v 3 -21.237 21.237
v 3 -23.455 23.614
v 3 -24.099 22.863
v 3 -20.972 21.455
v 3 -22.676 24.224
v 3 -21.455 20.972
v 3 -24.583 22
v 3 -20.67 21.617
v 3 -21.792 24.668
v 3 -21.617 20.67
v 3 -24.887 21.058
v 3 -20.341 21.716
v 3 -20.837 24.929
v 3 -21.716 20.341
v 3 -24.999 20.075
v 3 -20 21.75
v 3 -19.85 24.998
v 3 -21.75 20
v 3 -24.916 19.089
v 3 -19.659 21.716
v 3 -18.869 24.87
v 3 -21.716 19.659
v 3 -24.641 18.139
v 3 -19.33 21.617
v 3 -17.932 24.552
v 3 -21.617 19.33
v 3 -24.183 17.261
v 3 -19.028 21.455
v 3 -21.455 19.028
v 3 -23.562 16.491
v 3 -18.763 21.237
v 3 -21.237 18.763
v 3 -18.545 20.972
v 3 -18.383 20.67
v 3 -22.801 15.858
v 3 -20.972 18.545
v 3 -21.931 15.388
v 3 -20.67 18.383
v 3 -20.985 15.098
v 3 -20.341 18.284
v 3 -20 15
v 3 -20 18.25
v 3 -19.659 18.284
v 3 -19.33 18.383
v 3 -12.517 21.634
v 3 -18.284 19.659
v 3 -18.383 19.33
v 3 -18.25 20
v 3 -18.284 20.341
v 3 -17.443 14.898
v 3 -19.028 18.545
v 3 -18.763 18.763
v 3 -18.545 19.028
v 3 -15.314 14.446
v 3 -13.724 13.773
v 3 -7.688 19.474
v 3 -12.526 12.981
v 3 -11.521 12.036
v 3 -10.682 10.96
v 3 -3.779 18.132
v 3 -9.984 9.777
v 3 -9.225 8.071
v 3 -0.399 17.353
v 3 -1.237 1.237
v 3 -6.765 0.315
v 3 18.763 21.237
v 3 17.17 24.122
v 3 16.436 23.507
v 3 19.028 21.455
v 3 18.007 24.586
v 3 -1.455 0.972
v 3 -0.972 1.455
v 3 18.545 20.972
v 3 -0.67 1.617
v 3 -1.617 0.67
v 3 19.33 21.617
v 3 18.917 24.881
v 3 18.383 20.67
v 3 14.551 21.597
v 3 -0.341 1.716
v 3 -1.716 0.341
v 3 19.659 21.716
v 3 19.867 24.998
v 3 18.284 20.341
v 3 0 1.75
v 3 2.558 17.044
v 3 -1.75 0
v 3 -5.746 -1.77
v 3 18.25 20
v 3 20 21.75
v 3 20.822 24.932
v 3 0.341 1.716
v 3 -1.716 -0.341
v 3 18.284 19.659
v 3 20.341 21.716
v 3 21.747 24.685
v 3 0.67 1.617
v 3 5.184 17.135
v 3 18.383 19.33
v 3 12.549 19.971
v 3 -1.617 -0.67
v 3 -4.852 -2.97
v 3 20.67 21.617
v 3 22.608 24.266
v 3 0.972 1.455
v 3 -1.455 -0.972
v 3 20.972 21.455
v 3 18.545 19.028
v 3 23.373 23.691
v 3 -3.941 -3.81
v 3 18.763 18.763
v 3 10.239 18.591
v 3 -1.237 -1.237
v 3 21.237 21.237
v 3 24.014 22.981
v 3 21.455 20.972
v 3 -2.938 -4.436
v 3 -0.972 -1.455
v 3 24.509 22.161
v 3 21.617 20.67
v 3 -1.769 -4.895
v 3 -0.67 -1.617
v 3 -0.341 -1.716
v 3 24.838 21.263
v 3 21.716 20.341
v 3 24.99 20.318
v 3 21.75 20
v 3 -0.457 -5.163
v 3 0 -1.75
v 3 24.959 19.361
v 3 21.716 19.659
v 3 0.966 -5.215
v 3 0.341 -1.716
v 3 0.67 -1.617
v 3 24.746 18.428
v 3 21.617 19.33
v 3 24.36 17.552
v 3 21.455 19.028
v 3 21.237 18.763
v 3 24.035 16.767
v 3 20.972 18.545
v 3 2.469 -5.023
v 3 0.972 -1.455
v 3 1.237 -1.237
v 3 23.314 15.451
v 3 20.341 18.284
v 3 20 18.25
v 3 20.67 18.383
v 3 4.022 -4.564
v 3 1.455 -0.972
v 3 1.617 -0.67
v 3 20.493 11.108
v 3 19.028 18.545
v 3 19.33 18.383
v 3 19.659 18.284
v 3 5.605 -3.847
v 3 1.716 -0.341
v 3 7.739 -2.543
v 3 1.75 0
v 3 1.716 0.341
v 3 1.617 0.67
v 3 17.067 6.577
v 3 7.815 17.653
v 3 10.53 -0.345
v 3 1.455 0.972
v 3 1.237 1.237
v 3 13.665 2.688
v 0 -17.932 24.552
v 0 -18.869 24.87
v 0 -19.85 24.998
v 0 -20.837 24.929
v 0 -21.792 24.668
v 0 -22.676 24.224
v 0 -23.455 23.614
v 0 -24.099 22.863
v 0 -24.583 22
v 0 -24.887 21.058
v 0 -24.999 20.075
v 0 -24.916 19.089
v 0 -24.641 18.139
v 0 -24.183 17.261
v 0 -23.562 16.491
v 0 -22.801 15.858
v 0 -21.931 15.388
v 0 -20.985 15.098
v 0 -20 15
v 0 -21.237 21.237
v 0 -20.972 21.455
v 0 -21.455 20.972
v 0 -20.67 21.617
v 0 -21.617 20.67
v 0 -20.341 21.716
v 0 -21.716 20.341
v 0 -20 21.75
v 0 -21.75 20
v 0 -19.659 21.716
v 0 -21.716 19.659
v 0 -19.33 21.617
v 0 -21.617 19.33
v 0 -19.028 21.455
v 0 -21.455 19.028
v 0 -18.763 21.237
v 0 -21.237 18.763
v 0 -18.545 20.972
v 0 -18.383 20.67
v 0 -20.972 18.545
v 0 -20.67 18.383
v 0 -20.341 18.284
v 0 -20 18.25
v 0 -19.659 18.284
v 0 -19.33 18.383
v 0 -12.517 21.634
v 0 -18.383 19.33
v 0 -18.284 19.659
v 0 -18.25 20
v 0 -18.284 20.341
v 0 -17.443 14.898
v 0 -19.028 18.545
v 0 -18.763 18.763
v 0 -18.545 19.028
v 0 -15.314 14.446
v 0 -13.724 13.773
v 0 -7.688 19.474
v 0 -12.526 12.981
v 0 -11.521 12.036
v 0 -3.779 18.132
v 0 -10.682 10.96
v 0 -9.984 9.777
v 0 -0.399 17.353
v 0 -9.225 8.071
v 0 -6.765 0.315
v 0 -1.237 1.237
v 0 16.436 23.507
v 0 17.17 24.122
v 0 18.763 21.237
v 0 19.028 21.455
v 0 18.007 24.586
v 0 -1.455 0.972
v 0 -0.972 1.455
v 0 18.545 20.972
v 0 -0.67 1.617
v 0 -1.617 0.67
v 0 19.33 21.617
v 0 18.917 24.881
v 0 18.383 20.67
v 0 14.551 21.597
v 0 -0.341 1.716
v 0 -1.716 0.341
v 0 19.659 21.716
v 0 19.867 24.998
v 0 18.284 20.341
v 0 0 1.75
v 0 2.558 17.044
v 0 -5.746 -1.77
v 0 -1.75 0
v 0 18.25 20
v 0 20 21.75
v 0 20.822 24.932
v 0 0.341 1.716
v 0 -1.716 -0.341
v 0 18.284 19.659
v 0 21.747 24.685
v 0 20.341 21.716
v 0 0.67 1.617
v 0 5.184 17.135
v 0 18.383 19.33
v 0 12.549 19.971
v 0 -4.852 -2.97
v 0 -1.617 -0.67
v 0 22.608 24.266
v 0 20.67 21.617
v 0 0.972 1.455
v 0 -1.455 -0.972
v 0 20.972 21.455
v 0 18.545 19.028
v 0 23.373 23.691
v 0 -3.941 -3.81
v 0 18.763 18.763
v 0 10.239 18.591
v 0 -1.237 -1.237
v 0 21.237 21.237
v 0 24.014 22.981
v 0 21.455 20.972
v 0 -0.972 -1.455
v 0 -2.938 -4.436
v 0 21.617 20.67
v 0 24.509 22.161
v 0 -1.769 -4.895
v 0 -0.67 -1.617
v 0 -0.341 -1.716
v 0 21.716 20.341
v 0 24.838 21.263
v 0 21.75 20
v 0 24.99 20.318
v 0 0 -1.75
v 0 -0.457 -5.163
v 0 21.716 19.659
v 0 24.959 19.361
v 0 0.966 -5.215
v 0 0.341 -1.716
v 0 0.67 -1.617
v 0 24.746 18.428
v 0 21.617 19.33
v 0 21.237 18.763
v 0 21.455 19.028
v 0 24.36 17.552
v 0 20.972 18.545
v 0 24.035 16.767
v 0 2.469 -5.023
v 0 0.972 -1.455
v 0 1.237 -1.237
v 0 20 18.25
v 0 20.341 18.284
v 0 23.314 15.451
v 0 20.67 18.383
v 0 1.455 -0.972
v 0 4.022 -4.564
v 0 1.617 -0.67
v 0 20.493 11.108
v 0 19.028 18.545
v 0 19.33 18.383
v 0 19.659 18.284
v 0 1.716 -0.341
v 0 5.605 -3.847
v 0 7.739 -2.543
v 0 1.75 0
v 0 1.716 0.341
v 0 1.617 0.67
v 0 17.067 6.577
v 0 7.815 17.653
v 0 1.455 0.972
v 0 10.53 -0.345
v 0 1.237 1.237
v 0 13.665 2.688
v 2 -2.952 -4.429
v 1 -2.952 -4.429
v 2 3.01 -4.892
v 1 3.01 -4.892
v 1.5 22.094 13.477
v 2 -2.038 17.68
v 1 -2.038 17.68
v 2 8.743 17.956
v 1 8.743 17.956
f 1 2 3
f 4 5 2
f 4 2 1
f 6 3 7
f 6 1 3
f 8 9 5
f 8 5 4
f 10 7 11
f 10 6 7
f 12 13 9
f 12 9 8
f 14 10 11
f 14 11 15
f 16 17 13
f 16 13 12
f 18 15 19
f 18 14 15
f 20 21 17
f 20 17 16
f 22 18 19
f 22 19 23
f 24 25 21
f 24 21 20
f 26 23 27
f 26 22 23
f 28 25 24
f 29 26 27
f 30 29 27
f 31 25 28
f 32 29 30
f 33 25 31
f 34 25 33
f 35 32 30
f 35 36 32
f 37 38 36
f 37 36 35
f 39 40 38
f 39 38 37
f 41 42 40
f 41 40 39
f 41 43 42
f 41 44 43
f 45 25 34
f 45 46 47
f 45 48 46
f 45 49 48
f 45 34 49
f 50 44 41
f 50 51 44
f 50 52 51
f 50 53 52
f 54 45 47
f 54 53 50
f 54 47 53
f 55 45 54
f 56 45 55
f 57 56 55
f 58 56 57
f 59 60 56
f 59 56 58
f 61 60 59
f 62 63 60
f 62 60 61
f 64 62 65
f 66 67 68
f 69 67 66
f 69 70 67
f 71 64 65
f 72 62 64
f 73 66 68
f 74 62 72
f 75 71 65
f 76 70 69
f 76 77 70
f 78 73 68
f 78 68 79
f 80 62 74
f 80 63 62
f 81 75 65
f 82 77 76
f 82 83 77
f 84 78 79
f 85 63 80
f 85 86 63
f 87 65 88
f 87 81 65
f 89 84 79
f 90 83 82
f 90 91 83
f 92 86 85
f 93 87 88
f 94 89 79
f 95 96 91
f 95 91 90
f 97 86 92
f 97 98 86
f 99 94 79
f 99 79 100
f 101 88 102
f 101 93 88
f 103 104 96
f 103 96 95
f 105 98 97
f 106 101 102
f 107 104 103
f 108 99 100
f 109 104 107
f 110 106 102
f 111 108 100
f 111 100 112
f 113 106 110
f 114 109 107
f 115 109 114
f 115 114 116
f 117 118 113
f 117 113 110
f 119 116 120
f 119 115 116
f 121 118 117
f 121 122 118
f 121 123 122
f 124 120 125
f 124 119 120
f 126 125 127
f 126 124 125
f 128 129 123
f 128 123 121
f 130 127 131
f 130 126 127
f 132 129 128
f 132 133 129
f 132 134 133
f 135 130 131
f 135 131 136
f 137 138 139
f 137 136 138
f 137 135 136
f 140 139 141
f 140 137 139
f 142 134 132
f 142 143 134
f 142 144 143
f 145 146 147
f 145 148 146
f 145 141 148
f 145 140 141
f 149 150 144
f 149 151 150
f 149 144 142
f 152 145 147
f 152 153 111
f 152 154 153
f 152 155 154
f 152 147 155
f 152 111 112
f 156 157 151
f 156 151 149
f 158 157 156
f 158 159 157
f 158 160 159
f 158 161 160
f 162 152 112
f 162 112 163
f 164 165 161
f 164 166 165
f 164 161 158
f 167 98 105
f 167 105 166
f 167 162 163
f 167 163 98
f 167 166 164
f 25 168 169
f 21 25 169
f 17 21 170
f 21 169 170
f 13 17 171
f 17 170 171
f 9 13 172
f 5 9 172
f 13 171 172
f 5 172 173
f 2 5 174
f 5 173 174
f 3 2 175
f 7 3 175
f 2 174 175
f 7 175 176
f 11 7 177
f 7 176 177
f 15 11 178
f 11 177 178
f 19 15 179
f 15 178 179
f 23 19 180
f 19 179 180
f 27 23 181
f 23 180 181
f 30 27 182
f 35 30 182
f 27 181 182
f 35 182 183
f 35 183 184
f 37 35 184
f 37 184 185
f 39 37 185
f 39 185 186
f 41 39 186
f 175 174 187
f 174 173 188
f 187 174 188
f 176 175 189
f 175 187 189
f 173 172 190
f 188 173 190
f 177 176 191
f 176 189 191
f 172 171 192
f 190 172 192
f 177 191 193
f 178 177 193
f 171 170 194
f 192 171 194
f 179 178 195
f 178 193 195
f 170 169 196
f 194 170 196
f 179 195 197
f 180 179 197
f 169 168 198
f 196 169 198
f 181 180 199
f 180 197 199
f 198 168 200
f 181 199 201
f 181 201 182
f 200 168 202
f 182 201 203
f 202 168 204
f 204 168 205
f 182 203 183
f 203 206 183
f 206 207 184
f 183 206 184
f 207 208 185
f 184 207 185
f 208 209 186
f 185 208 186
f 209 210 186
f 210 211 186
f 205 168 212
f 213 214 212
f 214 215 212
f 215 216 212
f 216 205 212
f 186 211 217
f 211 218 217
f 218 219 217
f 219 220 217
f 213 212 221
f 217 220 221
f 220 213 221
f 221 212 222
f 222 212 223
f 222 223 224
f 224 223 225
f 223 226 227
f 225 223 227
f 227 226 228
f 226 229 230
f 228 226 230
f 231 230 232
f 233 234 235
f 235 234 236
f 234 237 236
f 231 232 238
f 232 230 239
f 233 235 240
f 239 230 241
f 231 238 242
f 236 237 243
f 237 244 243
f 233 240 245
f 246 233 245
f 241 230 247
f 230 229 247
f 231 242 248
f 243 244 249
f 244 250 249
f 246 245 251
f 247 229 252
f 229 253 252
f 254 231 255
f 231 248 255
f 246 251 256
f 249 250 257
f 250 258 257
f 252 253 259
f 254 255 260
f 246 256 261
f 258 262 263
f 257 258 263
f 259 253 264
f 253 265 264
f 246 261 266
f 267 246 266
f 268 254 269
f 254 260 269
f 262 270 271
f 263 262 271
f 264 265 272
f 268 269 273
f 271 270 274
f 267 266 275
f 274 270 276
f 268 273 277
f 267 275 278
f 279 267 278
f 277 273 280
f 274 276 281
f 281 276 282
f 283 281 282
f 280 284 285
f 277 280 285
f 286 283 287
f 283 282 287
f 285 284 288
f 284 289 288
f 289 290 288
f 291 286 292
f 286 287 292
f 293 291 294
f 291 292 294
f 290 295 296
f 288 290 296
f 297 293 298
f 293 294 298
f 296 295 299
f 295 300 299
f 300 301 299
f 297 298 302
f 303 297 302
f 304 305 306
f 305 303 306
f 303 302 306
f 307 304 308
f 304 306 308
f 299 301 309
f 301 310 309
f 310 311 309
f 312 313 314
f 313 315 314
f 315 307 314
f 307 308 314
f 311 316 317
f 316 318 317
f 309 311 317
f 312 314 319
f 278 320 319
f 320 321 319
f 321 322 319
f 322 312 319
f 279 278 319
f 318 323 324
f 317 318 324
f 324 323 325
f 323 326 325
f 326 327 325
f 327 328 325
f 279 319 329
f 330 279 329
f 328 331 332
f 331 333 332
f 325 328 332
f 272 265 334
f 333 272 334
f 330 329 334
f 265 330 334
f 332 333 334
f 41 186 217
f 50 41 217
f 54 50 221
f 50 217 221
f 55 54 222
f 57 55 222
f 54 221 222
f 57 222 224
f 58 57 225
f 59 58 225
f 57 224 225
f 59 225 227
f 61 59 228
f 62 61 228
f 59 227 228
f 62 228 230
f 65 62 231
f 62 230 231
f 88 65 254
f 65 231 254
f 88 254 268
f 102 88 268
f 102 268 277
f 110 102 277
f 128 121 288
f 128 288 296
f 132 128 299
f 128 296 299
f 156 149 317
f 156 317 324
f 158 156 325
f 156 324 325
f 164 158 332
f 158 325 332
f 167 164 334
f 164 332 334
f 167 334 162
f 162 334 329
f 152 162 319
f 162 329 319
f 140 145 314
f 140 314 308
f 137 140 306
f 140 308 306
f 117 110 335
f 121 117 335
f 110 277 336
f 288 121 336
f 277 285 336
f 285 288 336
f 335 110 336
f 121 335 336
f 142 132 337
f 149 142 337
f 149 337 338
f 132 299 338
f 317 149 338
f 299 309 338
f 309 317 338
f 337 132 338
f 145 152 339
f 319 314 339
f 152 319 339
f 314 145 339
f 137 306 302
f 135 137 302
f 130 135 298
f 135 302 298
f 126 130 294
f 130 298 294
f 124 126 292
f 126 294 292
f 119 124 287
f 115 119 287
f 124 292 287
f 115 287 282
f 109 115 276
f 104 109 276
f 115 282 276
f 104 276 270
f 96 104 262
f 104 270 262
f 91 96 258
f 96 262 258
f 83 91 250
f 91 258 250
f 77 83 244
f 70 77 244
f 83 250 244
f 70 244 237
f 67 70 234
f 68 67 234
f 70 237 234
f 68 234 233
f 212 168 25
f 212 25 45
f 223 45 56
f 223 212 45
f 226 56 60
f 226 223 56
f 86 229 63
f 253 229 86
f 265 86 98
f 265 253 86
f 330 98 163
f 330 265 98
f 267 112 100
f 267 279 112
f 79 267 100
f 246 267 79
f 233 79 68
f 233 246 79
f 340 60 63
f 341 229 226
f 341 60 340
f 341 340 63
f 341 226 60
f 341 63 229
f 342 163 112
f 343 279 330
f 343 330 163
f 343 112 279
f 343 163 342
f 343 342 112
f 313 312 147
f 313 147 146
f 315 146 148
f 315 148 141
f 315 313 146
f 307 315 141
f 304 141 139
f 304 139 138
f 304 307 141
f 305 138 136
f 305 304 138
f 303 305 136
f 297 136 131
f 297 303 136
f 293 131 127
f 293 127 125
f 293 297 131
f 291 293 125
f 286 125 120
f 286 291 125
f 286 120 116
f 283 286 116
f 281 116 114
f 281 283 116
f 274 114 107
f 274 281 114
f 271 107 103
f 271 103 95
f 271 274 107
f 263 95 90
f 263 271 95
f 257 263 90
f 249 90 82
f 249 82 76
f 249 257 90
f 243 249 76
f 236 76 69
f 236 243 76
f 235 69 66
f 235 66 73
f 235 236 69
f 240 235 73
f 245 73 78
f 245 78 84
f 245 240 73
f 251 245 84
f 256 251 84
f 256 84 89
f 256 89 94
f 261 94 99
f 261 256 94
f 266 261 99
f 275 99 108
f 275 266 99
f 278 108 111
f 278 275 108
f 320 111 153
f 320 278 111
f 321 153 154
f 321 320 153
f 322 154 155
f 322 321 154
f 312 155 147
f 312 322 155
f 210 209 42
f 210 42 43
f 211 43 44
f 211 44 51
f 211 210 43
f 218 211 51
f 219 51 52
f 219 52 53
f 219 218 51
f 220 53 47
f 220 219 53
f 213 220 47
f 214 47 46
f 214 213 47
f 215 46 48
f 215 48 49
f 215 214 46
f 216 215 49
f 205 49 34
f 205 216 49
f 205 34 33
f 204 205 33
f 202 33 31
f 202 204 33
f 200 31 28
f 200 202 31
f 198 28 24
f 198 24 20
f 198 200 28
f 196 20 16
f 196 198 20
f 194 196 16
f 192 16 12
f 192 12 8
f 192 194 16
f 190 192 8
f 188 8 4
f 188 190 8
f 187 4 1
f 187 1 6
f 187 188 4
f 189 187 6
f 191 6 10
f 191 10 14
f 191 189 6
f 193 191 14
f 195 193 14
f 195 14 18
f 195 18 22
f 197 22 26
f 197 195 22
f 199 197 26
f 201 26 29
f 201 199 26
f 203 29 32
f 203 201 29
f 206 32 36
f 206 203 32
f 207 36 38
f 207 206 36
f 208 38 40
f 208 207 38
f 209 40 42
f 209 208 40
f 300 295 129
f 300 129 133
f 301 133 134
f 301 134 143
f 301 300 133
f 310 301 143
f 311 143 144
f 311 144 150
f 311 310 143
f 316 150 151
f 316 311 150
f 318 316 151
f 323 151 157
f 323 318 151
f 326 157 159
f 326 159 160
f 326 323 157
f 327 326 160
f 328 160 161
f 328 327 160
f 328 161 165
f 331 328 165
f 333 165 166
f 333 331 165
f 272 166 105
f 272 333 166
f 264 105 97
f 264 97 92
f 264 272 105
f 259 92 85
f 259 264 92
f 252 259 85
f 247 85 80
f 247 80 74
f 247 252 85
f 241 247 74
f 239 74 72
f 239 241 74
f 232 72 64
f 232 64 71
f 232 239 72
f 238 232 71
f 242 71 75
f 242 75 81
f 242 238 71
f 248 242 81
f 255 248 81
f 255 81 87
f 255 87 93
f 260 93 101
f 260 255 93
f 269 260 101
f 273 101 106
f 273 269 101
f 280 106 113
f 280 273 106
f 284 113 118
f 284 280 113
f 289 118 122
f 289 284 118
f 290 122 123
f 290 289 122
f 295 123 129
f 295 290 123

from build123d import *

# Parameters (mm, degrees)
CROQUIS1_R              = 1.75
SALIENTE_EXTRUIR2_DEPTH = 3


with BuildPart() as part:
    # Croquis1 → Saliente-Extruir2 (new body)
    with BuildSketch(Plane(origin=(0, 0, 0), x_dir=(0, 0, -1), z_dir=(1, 0, 0))):
        with BuildLine():
            ThreePointArc((-24.552322054, -17.932062883), (-21.057920066, -24.886799068), (-15, -20))
            add(Edge.make_bspline(
                [(-15, -20), (-15.466760547, -5.270966712), (3.897936139, -11.668910874), (6.648630912, 9.647963486), (-15.563211903, 23.896857347), (-17.552150511, 24.359820281)],
                knots=[0, 0, 0, 0, 0.482956451, 0.582956451, 1, 1, 1, 1], degree=3))
            ThreePointArc((-17.552150511, 24.359820281), (-23.997039566, 23.003943193), (-23.507065356, 16.436224953))
            add(Edge.make_bspline(
                [(-24.552322054, -17.932062883), (-13.483033173, 1.193565845), (-15.941216968, 9.612334544), (-23.507065356, 16.436224953)],
                knots=[0, 0, 0, 0, 1, 1, 1, 1], degree=3))
        make_face()
        with Locations((-20, 20)):
            Circle(CROQUIS1_R, mode=Mode.SUBTRACT)
        Circle(CROQUIS1_R, mode=Mode.SUBTRACT)
        with Locations((-20, -20)):
            Circle(CROQUIS1_R, mode=Mode.SUBTRACT)
    extrude(amount=SALIENTE_EXTRUIR2_DEPTH)


solid = part.part
